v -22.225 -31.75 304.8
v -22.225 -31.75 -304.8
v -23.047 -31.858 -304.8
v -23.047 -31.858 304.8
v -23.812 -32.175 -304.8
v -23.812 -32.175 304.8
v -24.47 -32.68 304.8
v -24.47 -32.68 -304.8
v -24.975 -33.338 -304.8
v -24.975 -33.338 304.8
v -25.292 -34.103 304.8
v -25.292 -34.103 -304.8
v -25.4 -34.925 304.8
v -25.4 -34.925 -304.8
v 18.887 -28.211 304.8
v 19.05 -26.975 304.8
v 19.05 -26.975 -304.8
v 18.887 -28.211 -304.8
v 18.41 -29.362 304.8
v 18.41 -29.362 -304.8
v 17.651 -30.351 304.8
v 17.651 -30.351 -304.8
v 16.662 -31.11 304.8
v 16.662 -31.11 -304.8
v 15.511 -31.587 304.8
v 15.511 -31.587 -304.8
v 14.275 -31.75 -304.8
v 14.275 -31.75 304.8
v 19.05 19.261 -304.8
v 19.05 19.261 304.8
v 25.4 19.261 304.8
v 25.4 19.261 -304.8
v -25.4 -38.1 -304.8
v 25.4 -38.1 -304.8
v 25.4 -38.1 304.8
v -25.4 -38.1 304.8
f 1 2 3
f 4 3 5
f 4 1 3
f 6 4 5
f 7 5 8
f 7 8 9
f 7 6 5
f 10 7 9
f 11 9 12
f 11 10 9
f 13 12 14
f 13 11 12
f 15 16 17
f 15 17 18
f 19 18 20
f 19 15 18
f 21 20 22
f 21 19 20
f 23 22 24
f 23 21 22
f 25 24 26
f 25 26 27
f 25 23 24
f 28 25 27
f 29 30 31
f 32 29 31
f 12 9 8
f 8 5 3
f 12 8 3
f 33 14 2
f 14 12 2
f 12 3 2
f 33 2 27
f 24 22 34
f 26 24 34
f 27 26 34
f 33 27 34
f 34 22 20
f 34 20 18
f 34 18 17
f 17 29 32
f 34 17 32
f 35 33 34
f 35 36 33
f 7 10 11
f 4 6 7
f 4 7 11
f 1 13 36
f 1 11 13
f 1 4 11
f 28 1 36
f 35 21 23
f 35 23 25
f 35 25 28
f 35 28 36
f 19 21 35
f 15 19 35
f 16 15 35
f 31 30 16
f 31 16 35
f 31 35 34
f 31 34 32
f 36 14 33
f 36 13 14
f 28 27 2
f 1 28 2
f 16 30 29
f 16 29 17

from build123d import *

# Parameters (mm, degrees)
BOSS_EXTRUDE1_DEPTH = 304.8
SKETCH3_W           = 30.020943331
SKETCH3_H           = 21.596699029
CUT_EXTRUDE1_DEPTH  = 612.317372565


with BuildPart() as part:
    # Sketch2 → Boss-Extrude1 (new, symmetric)
    with BuildSketch(Plane.XY):
        with BuildLine():
            Line((-25.4, -38.1), (25.4, -38.1))
            Line((25.4, -38.1), (25.4, 38.1))
            Line((25.4, 38.1), (22.225, 38.1))
            ThreePointArc((22.225, 38.1), (19.97993597, 37.17006403), (19.05, 34.925))
            Line((19.05, 34.925), (19.05, -26.9748))
            ThreePointArc((19.05, -26.9748), (17.651376302, -30.351376302), (14.2748, -31.75))
            Line((14.2748, -31.75), (-22.225, -31.75))
            ThreePointArc((-22.225, -31.75), (-24.47006403, -32.67993597), (-25.4, -34.925))
            Line((-25.4, -34.925), (-25.4, -38.1))
        make_face()
    extrude(amount=BOSS_EXTRUDE1_DEPTH, both=True)

    # Sketch3 → Cut-Extrude1 (cut, through all)
    with BuildSketch(Plane.XY.offset(304.8)):
        with Locations((23.779344144, 30.05923535)):
            Rectangle(SKETCH3_W, SKETCH3_H)
    extrude(amount=-CUT_EXTRUDE1_DEPTH, mode=Mode.SUBTRACT)


solid = part.part
